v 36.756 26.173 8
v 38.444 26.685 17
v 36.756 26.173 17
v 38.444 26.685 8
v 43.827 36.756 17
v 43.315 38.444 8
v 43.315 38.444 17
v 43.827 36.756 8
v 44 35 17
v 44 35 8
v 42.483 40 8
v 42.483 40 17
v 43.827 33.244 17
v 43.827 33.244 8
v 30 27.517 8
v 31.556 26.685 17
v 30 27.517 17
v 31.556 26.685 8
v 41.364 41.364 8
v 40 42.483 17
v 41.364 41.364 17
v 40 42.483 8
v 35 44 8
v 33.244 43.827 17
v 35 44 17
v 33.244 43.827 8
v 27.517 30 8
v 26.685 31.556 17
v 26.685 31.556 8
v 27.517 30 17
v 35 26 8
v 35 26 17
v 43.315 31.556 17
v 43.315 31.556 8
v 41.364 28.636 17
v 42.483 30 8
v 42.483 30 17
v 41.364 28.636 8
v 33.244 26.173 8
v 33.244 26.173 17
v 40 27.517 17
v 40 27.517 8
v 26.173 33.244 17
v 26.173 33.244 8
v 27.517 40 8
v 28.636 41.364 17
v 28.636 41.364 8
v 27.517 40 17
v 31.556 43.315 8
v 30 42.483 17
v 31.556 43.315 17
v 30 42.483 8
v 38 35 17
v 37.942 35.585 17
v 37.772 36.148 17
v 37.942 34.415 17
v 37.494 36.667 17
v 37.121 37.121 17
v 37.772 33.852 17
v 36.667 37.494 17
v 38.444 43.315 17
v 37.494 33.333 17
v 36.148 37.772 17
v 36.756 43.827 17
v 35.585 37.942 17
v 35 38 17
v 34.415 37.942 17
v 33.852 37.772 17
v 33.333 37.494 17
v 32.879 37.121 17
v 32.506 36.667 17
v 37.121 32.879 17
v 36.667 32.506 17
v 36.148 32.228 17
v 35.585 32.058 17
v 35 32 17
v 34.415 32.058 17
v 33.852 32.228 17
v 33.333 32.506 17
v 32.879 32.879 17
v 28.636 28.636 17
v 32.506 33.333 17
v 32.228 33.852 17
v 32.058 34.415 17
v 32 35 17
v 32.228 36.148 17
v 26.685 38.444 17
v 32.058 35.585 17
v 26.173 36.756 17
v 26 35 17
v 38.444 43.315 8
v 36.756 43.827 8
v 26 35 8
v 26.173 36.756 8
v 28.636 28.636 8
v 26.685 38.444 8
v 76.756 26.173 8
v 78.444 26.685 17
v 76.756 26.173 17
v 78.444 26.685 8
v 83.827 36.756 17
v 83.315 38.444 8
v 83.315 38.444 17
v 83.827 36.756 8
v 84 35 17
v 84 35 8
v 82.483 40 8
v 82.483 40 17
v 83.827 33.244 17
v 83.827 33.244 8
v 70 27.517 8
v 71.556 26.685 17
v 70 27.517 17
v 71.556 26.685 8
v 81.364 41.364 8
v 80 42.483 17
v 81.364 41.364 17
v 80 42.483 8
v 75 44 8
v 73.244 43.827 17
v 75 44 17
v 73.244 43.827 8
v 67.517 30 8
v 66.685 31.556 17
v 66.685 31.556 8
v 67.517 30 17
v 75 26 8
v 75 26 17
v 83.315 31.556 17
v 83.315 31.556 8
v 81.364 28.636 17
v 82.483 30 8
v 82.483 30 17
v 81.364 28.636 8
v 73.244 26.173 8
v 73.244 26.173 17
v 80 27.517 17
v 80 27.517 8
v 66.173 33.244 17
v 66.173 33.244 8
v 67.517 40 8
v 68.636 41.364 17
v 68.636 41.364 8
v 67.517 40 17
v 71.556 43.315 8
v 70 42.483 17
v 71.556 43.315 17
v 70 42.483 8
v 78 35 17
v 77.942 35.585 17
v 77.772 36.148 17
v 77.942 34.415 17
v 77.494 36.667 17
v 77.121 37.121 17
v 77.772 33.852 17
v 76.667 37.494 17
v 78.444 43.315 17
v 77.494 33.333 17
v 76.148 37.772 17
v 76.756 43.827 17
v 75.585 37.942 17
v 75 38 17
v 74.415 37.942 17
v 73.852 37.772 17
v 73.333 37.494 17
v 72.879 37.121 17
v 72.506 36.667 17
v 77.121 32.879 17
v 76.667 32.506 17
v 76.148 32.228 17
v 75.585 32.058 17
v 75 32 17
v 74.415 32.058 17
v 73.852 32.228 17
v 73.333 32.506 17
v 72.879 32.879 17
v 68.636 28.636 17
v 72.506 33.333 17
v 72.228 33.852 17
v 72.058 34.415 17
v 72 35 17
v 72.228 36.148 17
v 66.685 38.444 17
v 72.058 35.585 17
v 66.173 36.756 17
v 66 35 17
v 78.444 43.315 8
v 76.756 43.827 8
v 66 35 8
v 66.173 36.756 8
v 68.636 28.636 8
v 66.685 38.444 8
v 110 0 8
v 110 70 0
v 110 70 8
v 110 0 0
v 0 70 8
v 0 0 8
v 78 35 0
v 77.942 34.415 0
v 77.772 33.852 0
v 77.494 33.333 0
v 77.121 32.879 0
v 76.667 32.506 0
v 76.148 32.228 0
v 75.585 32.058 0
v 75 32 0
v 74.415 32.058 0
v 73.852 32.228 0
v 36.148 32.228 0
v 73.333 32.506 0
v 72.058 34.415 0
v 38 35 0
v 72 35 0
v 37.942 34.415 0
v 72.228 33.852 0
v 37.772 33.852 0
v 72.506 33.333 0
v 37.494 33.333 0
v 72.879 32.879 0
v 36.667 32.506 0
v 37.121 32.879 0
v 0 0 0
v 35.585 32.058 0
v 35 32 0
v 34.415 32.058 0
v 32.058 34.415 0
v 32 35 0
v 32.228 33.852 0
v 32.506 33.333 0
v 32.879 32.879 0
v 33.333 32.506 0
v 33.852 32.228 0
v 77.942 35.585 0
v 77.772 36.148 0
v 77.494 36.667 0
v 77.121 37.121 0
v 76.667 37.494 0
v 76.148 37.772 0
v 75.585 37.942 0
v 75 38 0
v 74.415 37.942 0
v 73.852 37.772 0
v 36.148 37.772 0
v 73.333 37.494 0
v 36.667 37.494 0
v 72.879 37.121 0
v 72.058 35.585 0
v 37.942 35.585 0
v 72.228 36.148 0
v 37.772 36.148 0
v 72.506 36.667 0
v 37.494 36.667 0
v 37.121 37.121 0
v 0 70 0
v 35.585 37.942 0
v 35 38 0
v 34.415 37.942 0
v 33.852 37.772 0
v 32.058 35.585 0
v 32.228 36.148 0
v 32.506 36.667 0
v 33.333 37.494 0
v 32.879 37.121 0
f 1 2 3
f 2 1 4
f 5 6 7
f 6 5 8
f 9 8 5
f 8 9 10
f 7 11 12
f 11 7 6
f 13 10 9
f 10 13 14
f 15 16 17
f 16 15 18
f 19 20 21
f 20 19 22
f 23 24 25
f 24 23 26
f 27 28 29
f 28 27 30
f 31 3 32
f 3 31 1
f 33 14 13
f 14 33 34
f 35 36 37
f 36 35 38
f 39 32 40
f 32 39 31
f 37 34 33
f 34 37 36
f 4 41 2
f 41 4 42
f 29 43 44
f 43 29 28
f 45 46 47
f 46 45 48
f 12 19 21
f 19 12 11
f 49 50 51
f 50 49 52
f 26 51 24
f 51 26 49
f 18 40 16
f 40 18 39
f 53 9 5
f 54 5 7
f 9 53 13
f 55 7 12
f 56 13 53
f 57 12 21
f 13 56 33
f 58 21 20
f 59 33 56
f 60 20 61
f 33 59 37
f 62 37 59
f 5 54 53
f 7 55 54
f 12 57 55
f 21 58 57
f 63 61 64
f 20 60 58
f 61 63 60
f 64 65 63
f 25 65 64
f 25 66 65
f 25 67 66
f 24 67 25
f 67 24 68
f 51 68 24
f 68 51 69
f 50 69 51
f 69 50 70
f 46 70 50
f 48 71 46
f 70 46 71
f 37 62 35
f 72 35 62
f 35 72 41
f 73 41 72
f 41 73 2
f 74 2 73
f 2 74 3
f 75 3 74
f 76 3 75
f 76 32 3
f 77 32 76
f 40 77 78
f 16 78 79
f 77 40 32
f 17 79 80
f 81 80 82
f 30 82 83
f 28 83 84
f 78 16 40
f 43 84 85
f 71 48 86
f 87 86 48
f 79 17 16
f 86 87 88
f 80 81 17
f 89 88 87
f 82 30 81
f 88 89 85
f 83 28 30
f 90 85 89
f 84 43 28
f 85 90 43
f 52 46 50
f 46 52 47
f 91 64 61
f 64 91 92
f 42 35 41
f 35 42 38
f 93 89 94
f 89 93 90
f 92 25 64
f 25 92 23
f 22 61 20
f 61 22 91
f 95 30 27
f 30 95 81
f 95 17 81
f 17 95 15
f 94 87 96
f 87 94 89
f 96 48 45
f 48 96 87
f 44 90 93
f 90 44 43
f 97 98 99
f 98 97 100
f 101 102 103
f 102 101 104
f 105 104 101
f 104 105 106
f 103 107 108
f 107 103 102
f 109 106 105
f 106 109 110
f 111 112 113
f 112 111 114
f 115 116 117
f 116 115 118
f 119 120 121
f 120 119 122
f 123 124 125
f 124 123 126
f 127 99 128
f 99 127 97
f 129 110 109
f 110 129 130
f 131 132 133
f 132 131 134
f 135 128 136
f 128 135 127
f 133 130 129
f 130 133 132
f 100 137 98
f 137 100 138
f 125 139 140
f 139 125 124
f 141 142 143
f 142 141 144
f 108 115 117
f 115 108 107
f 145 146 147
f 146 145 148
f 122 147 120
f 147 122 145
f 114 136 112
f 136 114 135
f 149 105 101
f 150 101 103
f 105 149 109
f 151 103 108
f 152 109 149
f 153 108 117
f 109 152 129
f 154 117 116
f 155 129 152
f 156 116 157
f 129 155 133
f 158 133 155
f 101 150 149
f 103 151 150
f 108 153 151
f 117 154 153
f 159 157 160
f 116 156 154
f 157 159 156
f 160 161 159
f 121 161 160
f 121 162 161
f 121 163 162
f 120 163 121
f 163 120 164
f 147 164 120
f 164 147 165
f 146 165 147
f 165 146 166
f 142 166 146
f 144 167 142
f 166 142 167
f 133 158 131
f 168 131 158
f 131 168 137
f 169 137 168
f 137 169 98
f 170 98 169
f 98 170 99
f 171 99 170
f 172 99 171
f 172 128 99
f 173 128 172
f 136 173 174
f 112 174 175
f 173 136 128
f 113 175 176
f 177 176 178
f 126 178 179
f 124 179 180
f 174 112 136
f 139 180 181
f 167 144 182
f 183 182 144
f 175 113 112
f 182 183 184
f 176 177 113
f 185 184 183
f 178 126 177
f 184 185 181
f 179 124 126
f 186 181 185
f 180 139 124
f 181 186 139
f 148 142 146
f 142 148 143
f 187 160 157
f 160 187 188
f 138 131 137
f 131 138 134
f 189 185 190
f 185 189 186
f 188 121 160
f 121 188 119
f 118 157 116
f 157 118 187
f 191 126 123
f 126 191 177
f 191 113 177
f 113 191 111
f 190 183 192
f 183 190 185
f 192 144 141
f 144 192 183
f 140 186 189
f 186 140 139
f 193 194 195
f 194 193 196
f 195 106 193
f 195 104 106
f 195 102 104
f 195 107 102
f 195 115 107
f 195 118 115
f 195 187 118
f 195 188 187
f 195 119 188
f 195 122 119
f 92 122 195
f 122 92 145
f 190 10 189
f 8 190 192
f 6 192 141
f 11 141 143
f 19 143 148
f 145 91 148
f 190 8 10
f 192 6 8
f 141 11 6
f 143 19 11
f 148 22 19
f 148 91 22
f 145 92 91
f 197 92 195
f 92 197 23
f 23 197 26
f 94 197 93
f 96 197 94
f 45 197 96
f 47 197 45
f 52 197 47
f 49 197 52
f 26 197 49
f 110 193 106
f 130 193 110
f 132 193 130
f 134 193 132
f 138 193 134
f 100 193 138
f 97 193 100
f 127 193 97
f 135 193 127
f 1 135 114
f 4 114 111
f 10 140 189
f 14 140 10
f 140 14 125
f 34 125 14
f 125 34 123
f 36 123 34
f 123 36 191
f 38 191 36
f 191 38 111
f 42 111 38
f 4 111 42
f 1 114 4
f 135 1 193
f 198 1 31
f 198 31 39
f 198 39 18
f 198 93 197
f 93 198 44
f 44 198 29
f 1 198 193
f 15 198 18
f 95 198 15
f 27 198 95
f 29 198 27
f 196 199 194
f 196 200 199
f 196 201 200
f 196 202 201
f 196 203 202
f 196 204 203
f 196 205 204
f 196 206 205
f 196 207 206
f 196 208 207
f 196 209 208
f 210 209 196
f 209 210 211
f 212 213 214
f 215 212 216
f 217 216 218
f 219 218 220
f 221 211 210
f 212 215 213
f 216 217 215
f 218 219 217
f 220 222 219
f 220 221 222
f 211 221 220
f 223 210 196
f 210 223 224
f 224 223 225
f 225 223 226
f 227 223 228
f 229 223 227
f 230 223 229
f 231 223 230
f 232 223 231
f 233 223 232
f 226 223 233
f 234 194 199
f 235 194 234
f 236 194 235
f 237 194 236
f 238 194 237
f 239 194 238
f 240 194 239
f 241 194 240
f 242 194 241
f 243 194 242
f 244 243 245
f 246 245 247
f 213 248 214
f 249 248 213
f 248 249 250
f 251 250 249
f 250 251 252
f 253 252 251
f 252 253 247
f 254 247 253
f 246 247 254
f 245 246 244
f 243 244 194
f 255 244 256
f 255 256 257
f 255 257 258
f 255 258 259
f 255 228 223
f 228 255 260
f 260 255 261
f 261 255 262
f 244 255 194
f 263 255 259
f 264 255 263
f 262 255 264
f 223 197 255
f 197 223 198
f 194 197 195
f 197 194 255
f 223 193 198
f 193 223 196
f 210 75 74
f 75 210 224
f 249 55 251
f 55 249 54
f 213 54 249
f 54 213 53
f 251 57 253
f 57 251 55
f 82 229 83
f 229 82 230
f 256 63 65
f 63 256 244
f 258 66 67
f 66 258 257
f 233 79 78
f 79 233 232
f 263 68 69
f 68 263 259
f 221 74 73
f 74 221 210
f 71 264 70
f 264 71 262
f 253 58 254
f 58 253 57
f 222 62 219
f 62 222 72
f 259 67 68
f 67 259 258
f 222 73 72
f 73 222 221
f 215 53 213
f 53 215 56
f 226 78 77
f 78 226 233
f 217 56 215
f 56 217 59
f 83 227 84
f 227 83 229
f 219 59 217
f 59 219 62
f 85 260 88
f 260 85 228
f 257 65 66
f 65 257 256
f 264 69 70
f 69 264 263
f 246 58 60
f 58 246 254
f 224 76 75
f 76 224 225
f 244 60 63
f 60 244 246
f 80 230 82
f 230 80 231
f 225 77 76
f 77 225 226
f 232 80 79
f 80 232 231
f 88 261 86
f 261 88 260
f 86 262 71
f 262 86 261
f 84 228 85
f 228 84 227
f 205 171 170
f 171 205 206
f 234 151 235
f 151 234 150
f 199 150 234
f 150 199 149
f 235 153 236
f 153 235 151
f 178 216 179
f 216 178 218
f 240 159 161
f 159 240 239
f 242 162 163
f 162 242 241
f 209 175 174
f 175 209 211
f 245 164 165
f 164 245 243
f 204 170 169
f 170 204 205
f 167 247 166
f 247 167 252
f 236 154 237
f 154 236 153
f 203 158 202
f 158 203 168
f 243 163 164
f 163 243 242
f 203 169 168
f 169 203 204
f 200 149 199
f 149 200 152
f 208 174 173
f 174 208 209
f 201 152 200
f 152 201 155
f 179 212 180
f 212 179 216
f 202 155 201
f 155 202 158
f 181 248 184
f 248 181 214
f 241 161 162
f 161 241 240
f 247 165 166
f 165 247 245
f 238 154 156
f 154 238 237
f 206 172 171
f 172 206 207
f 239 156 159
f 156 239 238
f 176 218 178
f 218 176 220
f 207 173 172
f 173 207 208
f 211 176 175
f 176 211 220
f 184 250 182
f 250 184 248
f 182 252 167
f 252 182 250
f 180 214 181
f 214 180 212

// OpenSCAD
$fn = 32;

// ----------------------------------------------------------------------
// Drill jig: two_boss jig
// ----------------------------------------------------------------------

// --- parameters (mm) ---
plate_l = 110;            // plate length, X
plate_w = 70;             // plate width, Y
plate_t = 8;              // plate thickness
boss_d = 18;              // guide boss diameter
boss_h = 10;              // boss height above the plate
guide_d = 6;              // guide hole diameter
boss_pitch = 40;          // boss pitch

n_boss = 2;  // guide bosses
boss_x0 = (plate_l - (n_boss - 1) * boss_pitch) / 2;  // first boss X
boss_top = plate_t - 1 + boss_h;  // boss crown height
total_h = boss_top;  // overall height

difference() {
  union() {
  cube([plate_l, plate_w, plate_t]);
  for (i = [0 : n_boss - 1])
    translate([boss_x0 + i * boss_pitch, plate_w / 2, plate_t - 1])
      cylinder(h = boss_h, d = boss_d);
  }
  for (i = [0 : n_boss - 1])
    translate([boss_x0 + i * boss_pitch, plate_w / 2, -1])
      cylinder(h = plate_t + boss_h, d = guide_d);
}
